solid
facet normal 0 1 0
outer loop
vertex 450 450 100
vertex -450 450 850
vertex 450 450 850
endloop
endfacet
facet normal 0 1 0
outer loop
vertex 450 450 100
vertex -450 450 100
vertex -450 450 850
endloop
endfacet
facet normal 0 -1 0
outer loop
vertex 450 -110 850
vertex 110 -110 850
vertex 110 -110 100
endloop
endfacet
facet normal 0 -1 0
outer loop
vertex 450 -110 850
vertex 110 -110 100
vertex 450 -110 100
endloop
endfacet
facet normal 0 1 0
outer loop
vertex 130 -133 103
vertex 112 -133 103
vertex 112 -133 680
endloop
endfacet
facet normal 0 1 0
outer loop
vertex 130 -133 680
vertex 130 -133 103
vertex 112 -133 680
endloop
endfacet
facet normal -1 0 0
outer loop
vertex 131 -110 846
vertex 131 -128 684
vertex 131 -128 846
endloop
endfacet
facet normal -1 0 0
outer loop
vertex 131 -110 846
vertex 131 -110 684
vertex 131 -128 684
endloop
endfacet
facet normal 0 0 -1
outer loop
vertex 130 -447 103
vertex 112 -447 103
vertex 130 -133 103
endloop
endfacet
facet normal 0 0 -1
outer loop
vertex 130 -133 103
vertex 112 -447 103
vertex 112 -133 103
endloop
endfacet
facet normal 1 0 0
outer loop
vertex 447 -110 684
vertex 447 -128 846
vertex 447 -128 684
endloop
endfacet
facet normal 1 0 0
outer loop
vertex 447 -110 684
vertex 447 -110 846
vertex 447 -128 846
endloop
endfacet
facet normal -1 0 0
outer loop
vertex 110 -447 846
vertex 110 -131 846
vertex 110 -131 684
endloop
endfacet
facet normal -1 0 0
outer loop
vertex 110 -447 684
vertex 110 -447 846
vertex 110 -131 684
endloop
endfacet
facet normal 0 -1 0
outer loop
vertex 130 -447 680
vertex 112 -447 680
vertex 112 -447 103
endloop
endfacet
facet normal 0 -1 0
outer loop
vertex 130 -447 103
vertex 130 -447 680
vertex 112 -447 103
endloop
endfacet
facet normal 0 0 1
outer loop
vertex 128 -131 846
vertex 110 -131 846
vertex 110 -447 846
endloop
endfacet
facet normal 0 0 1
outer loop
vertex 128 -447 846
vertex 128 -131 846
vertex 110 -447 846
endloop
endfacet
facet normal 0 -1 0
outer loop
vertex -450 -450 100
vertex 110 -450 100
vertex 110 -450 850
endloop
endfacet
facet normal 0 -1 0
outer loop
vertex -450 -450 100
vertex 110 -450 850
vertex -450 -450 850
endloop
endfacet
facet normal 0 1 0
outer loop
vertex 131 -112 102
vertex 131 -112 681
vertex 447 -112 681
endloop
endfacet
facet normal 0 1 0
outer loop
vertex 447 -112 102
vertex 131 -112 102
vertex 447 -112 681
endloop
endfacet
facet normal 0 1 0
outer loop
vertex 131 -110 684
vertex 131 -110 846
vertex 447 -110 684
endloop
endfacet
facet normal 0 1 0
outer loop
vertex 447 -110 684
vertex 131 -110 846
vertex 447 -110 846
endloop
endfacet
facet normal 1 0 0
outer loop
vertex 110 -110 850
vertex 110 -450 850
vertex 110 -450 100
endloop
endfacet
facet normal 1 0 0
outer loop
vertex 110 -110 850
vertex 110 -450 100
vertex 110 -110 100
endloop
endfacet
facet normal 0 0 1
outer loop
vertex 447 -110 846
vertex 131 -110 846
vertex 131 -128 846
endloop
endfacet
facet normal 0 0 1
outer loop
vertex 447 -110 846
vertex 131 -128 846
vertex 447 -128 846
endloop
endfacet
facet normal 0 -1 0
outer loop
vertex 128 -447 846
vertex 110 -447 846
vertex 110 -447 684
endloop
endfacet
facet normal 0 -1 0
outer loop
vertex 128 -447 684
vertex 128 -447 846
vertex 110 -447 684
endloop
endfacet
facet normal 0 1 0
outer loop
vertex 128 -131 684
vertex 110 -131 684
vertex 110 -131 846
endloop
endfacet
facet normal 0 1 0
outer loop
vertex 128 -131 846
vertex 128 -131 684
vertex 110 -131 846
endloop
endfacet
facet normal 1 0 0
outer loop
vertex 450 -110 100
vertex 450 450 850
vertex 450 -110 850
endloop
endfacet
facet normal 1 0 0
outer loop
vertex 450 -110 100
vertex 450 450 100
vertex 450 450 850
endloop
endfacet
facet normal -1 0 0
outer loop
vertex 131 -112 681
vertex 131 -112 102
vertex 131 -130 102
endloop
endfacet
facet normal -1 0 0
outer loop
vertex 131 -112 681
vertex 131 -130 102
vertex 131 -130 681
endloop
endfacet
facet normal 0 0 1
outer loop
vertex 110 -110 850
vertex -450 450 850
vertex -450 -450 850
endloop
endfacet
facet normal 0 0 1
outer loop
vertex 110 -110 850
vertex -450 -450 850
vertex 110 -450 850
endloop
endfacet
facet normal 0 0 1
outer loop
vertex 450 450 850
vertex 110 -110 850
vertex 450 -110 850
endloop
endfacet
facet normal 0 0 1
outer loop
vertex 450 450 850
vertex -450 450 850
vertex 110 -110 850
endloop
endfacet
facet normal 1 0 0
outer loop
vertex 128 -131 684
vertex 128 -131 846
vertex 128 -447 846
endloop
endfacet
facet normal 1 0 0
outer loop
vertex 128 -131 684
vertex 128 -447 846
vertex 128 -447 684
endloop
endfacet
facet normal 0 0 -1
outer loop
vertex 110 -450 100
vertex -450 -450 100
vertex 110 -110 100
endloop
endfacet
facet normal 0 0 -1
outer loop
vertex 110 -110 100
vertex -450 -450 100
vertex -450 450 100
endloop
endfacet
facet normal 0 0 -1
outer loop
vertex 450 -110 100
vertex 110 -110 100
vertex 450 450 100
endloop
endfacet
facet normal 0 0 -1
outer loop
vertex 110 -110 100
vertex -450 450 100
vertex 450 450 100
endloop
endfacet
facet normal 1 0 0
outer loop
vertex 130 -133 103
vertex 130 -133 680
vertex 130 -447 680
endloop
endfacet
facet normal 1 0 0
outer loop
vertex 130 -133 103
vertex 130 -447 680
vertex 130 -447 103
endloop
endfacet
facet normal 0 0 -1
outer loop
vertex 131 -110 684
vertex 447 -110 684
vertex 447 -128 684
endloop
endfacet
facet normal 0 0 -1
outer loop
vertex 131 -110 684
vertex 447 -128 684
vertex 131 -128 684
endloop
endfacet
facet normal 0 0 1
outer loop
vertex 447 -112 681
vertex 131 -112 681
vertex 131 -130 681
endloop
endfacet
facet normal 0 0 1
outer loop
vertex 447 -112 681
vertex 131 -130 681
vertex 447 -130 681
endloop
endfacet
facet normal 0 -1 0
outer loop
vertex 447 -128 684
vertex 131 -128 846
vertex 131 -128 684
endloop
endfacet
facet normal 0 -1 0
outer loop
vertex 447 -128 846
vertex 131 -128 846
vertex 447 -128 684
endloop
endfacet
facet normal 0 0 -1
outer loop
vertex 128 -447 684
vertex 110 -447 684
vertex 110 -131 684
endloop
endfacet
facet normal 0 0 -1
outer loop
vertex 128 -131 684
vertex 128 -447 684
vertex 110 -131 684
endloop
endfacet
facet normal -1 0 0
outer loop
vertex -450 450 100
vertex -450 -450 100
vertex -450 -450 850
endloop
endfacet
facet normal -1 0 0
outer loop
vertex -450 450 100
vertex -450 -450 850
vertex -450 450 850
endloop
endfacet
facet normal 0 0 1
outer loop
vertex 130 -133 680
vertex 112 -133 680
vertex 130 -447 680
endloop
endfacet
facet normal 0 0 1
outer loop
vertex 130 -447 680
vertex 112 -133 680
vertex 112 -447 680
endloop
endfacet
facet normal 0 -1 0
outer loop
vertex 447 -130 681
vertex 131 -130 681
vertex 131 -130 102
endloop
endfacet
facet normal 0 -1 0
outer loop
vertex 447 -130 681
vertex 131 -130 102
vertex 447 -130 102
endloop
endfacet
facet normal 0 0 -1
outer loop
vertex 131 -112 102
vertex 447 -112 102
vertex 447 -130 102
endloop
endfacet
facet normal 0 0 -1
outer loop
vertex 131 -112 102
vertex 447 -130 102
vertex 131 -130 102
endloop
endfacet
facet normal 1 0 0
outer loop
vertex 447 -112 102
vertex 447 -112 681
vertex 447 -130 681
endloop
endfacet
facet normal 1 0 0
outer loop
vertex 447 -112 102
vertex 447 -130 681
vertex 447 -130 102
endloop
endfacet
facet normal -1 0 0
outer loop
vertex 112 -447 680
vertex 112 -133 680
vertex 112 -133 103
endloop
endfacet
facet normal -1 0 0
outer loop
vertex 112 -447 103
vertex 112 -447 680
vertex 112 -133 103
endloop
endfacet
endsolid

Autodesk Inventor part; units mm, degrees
ref_plane "YZ Plane" through (0, 0, 0) normal (1, 0, 0) x (0, 1, 0)
ref_plane "XZ Plane" through (0, 0, 0) normal (0, 1, 0) x (-1, 0, 0)
sketch "Sketch1" plane through (0, 0, 0) normal (0, 0, 1) x (1, 0, 0)
  line L0 (-450, 450) -> (450, 450)
  line L1 (450, 450) -> (450, -450)
  line L2 (450, -450) -> (-450, -450)
  line L3 (-450, -450) -> (-450, 450)
  line L4 (-450, 450) -> (450, -450) construction
  line L5 (450, 450) -> (-450, -450) construction
  point P0 (0, 0)
  dimension "Width" = 900
  dimension "Depth" = 900
extrude "Extrusion1" add sketch "Sketch1" along normal blind 850
move faces "Move1" translate (0, 0, 100) faces at (-150, -150, 0)
sketch "Sketch2" plane through (0, 0, 850) normal (0, 0, 1) x (1, 0, 0)
  line L0 (450, 450) -> (-450, 450) projected
  line L1 (-450, 450) -> (-450, -450) projected
  line L2 (-450, -450) -> (450, -450) projected
  line L3 (450, -450) -> (450, 450) projected
  line L4 (450, -450) -> (450, 450) projected
  line L5 (450, -110) -> (110, -450)
  line L6 (-450, -450) -> (450, -450) projected
  point P0 (0, 0)
  dimension "d4" = 560
  dimension "d5" = 560
extrude "Extrusion2" cut sketch "Sketch2" against normal up to surface (850 mm away) contours L3 L2 L5
sketch "Sketch6" plane through (0, 0, 850) normal (0, 0, 1) x (1, 0, 0)
  line L0 (110, -450) -> (450, -110) projected
  line L1 (450, -110) -> (450, 450) projected
  line L2 (450, 450) -> (-450, 450) projected
  line L3 (-450, 450) -> (-450, -450) projected
  line L4 (-450, -450) -> (110, -450) projected
  line L5 (110, -450) -> (110, -110)
  line L6 (110, -110) -> (450, -110)
  point P0 (0, 0)
extrude "Extrusion7" cut sketch "Sketch6" against normal up to surface (750 mm away) contours L5 L6 L0
ref_plane "Work Plane1" through (0, 0, 684) normal (0, 0, 1) x (1, 0, 0)
sketch "Sketch7" plane through (110, -110, 850) normal (0, -1, 0) x (1, 0, 0)
  line L0 (340, -750) -> (0, -750) construction
  line L1 (340, 0) -> (340, -750) construction
  line L2 (0, 0) -> (340, 0) construction
  line L3 (0, 0) -> (0, -750) construction
  line L4 (-740, -166) -> (520, -166) construction
  line L5 (21, -4) -> (337, -4)
  line L6 (337, -4) -> (337, -166)
  line L7 (337, -166) -> (21, -166)
  line L8 (21, -166) -> (21, -4)
  point P0 (-110, -850)
  dimension "d33" = 3
  dimension "d34" = 21
  dimension "d35" = 4
extrude "Extrusion8" add sketch "Sketch7" along normal blind 18 separate body
sketch "Sketch8" plane through (110, -110, 850) normal (0, -1, 0) x (1, 0, 0)
  line L0 (340, -750) -> (0, -750) construction
  line L1 (340, 0) -> (340, -750) construction
  line L2 (0, 0) -> (340, 0) construction
  line L3 (0, 0) -> (0, -750) construction
  line L4 (337, -4) -> (21, -4) construction
  line L5 (21, -4) -> (21, -166) construction
  line L6 (21, -166) -> (337, -166) construction
  line L7 (337, -166) -> (337, -4) construction
  line L8 (21, -169) -> (337, -169)
  line L9 (337, -169) -> (337, -748)
  line L10 (337, -748) -> (21, -748)
  line L11 (21, -748) -> (21, -169)
  point P0 (-110, -850)
  dimension "d38" = 2
  dimension "d39" = 3
  dimension "d40" = 21
  dimension "d41" = 3
extrude "Extrusion9" add sketch "Sketch8" along normal blind 18 separate body
move or copy body "Move4" bodies to move or copy 3 copy no translate (0, -2, 0)
sketch "Sketch9" plane through (110, -450, 850) normal (1, 0, 0) x (0, 0, -1)
  line L0 (750, 340) -> (750, 0) construction
  line L1 (0, 340) -> (750, 340) construction
  line L2 (0, 0) -> (0, 340) construction
  line L3 (750, 0) -> (0, 0) construction
  line L4 (166, -180) -> (166, 1080) construction
  line L5 (4, 3) -> (166, 3)
  line L6 (166, 3) -> (166, 319)
  line L7 (166, 319) -> (4, 319)
  line L8 (4, 319) -> (4, 3)
  line L9 (4, 340) -> (166, 340) projected
  line L10 (4, 340) -> (4, 322) projected
  line L11 (166, 322) -> (4, 322) projected
  line L12 (166, 340) -> (166, 322) projected
  point P0 (850, 450)
  dimension "d53" = 3
  dimension "d54" = 4
  dimension "d55" = 3
extrude "Extrusion10" add sketch "Sketch9" along normal blind 18 separate body contours L8 L7 L6 L5
sketch "Sketch10" plane through (110, -450, 850) normal (1, 0, 0) x (0, 0, -1)
  line L0 (750, 340) -> (750, 0) construction
  line L1 (0, 340) -> (750, 340) construction
  line L2 (0, 0) -> (0, 340) construction
  line L3 (750, 0) -> (0, 0) construction
  line L4 (4, 3) -> (166, 3) construction
  line L5 (166, 3) -> (166, 319) construction
  line L6 (166, 319) -> (4, 319) construction
  line L7 (4, 319) -> (4, 3) construction
  line L8 (170, 3) -> (747, 3)
  line L9 (747, 3) -> (747, 317)
  line L10 (747, 317) -> (170, 317)
  line L11 (170, 317) -> (170, 3)
  line L12 (169, 338) -> (748, 338) projected
  line L13 (169, 338) -> (169, 320) projected
  line L14 (748, 320) -> (169, 320) projected
  line L15 (748, 338) -> (748, 320) projected
  point P0 (850, 450)
  dimension "d58" = 3
  dimension "d59" = 3
  dimension "d60" = 3
  dimension "d61" = 4
extrude "Extrusion11" add sketch "Sketch10" along normal blind 18 separate body contours L11 L10 L9 L8
move or copy body "Move5" bodies to move or copy 5 copy no translate (2, 0, 0)
equation "\"d36\" = Panel_thickness"
equation "\"d42\" = Panel_thickness"
equation "\"d56\" = Panel_thickness"
equation "\"d62\" = Panel_thickness"
equation "\"Panel_thickness\" = 18"
properties part number "Placed 90 d corner cabinet door"
